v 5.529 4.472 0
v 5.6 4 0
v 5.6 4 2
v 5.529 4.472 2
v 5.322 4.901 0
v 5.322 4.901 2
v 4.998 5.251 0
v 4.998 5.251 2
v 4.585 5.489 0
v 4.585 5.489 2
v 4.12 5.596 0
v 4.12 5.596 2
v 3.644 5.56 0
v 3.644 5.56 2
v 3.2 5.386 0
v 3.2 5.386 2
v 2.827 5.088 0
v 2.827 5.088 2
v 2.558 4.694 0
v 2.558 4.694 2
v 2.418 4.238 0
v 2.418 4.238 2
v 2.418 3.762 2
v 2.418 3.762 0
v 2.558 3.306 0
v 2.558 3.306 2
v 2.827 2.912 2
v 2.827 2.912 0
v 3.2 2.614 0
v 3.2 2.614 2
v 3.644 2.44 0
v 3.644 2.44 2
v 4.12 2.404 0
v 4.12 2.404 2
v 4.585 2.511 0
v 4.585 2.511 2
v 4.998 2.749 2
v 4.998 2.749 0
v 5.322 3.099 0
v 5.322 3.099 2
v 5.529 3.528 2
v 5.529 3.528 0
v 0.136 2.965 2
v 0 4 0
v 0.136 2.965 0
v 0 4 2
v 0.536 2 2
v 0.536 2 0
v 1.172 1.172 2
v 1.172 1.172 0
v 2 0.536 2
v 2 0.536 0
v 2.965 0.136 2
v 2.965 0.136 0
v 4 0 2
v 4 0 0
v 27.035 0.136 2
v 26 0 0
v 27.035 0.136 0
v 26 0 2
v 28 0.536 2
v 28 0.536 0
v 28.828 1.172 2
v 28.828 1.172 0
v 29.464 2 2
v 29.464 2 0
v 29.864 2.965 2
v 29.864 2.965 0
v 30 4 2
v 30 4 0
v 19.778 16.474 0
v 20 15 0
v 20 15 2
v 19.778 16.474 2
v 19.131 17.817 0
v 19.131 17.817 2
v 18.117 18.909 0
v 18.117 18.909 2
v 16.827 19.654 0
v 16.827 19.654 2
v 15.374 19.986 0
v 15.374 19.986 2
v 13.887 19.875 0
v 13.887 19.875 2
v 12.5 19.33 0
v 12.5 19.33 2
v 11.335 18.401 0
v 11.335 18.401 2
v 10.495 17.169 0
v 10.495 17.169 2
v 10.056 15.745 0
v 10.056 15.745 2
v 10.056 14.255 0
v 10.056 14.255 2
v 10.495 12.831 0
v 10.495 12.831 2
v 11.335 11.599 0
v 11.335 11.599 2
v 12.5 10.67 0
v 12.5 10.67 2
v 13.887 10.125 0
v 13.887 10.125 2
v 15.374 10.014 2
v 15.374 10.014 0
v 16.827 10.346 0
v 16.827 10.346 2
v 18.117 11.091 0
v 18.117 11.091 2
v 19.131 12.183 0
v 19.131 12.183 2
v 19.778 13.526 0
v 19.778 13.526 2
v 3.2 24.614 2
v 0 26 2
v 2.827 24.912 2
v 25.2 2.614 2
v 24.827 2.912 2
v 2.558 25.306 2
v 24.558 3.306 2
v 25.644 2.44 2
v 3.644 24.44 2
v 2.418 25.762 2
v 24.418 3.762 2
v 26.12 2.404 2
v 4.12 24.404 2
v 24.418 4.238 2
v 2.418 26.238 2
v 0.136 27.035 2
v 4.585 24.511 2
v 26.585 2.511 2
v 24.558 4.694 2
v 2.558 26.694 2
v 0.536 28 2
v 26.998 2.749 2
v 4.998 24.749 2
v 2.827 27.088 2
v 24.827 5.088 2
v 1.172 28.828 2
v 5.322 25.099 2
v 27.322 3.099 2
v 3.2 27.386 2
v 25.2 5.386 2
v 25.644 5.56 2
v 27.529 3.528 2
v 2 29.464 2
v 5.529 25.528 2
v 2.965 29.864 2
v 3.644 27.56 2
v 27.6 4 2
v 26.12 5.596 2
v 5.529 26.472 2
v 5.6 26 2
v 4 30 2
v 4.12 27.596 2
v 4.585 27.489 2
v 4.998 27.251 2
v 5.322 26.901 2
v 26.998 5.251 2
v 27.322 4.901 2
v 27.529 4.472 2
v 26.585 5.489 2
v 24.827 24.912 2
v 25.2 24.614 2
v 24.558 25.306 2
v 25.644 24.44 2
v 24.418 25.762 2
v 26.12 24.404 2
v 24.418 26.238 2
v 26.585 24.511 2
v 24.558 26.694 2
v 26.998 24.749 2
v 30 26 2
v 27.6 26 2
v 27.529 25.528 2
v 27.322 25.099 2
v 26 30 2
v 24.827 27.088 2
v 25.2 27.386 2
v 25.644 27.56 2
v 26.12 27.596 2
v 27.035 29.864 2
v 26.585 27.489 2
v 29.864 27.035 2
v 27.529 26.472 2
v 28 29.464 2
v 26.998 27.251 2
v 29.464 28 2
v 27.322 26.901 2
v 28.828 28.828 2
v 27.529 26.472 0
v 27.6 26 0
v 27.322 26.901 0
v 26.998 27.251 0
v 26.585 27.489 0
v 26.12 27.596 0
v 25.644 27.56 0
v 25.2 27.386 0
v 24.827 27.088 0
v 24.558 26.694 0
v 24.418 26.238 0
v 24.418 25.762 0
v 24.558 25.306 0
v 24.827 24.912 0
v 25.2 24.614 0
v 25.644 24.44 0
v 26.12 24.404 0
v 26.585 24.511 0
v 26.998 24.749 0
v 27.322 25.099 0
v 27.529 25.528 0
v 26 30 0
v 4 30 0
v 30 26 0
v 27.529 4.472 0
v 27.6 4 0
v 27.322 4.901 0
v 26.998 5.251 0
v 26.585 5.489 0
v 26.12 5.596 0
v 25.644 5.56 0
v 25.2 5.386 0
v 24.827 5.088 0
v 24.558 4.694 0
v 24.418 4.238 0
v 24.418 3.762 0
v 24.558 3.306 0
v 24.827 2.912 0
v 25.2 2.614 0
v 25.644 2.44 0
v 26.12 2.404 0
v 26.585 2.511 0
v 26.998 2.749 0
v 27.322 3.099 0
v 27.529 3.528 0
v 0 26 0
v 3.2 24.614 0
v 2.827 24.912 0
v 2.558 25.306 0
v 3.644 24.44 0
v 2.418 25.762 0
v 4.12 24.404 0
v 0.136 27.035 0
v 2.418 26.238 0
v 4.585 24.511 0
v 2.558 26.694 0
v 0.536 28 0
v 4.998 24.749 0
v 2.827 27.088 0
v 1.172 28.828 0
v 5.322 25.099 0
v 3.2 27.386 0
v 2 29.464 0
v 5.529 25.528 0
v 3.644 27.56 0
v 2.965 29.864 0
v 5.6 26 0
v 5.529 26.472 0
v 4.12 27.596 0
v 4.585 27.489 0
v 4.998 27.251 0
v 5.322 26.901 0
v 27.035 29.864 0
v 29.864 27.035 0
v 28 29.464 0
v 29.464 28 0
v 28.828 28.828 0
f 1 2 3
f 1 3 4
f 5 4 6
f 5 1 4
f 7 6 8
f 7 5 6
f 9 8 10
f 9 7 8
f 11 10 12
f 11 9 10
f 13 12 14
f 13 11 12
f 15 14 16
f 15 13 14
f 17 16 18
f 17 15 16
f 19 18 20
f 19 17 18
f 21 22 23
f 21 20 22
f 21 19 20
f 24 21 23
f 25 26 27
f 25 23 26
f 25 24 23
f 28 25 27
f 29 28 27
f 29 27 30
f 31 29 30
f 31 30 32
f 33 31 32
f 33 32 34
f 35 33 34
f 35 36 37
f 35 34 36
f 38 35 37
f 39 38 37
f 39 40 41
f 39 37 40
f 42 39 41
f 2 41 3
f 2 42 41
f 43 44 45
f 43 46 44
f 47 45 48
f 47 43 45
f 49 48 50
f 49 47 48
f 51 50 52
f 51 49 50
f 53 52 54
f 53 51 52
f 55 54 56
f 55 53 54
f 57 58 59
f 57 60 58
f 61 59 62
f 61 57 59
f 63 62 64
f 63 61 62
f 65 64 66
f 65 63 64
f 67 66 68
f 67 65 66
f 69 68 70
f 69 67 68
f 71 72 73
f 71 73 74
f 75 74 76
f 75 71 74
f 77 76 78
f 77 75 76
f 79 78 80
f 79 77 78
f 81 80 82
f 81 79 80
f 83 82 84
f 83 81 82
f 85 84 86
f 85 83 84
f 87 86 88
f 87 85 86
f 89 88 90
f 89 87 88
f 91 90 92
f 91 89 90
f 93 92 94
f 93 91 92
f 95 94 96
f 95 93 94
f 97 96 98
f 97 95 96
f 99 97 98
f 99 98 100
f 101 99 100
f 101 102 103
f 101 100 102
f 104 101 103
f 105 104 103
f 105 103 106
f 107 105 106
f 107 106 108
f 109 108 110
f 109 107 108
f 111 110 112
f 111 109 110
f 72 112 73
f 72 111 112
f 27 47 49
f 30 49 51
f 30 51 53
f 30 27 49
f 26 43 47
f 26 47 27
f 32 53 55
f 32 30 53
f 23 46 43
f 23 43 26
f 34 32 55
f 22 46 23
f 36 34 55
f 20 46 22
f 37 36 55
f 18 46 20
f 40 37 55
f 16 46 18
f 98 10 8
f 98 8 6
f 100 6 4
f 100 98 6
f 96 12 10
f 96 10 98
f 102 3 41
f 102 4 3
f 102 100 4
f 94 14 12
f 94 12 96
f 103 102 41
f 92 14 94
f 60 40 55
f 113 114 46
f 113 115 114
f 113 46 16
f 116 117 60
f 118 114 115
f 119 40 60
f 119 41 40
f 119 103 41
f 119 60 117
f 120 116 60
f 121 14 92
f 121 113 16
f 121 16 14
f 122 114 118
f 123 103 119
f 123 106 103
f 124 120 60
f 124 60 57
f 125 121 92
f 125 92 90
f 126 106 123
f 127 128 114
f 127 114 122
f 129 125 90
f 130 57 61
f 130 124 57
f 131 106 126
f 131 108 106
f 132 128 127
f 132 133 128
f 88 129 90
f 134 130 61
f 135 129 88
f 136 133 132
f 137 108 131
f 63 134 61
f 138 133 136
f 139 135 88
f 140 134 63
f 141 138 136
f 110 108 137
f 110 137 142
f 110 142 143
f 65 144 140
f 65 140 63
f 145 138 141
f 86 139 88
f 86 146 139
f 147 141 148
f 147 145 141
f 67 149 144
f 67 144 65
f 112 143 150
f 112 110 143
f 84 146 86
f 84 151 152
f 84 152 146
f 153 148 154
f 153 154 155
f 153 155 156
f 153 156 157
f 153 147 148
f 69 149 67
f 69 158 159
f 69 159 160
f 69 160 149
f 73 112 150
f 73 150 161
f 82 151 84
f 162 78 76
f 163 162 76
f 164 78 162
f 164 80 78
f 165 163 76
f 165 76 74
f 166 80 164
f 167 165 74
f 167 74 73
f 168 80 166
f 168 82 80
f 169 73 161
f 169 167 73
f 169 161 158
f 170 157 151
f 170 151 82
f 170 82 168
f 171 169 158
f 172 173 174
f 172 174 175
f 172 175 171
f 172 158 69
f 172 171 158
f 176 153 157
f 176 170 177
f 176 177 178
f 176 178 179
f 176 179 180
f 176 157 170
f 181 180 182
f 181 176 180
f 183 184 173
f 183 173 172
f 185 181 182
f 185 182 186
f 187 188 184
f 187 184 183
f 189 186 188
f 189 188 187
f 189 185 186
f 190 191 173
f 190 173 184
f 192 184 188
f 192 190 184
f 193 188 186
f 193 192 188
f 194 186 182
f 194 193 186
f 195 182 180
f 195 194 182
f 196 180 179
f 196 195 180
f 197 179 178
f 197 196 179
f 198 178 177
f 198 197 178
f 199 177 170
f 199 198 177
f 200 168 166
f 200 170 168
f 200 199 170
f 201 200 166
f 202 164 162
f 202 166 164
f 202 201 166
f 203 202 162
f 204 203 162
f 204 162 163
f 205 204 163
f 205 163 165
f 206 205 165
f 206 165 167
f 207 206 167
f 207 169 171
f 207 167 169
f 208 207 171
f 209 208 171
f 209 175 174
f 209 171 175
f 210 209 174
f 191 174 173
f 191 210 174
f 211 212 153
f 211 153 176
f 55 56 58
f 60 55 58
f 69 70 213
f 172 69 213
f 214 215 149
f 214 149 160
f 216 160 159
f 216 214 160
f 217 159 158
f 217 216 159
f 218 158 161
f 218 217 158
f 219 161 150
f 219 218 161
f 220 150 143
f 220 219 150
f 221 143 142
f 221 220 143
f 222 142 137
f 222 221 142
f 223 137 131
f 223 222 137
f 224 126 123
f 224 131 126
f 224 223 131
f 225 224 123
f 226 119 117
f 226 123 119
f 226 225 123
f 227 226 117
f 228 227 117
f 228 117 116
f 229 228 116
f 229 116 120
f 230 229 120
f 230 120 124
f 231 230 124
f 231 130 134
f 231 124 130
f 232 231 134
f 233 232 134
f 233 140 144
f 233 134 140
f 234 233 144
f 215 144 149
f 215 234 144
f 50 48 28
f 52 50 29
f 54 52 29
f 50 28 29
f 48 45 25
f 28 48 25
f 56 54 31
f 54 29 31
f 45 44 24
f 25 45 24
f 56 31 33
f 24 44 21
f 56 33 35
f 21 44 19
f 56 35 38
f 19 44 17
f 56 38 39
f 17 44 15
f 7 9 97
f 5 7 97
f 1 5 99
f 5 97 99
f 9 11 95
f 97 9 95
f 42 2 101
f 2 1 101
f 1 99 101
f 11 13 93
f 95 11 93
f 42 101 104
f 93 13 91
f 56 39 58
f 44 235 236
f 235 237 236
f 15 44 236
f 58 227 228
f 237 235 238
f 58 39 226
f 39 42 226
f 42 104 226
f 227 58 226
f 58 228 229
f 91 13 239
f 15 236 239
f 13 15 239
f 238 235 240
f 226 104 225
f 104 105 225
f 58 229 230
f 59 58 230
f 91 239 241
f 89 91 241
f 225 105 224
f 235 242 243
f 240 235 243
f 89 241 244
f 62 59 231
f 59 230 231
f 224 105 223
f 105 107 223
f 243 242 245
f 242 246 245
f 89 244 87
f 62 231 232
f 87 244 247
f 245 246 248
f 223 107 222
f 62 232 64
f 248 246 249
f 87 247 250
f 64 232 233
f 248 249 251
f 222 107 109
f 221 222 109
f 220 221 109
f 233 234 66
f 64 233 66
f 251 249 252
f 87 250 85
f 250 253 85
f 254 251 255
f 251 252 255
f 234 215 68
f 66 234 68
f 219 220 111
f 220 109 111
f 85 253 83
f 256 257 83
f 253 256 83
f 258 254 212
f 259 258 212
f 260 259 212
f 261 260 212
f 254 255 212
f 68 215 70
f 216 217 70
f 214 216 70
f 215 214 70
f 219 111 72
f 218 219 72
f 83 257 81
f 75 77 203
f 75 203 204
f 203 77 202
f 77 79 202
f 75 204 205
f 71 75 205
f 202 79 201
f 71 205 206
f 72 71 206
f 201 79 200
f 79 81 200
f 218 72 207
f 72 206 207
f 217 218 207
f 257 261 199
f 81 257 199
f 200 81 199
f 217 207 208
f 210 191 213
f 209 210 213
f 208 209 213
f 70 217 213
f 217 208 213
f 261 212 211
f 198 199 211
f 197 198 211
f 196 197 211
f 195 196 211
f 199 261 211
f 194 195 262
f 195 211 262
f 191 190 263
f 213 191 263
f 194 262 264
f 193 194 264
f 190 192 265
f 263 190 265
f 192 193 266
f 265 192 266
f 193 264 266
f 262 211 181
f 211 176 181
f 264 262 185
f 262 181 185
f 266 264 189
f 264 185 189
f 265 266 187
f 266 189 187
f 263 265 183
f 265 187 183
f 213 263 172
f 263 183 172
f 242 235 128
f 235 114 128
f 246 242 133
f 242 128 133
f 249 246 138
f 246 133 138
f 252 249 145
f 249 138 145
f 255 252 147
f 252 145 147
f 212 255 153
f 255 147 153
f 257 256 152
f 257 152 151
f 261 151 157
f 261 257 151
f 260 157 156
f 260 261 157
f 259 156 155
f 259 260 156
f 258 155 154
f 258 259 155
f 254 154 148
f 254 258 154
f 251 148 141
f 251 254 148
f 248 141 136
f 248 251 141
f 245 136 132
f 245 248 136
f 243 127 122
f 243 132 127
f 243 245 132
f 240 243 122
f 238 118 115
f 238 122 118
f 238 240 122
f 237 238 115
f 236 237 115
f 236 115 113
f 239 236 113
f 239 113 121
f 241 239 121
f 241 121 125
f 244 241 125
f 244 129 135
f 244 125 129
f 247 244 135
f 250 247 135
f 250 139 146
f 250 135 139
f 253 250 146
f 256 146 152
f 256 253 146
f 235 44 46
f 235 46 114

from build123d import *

# Parameters (mm, degrees)
CYLINDER057_R       = 5
CYLINDER057_DEPTH   = 15
CYLINDER058_R       = 1.6
CYLINDER058_DEPTH   = 20
ARRAY001029_X_COUNT = 2
ARRAY001029_X_PITCH = 22
ARRAY001029_Y_COUNT = 2
ARRAY001029_Y_PITCH = 22
BOX007_W            = 30
BOX007_H            = 30
BOX007_DEPTH        = 2
FILLET013_R         = 4


with BuildPart() as side_bearing_central_hole_cylinder001:
    # Cylinder057 → Cylinder057 (new body)
    with BuildSketch(Plane(origin=(15, 15, -4), x_dir=(1, 0, 0), z_dir=(0, 0, 1))):
        Circle(CYLINDER057_R)
    extrude(amount=CYLINDER057_DEPTH)


with BuildPart() as fusion039:
    # Cylinder058 → Cylinder058 (new body)
    with BuildSketch(Plane(origin=(4, 4, -7), x_dir=(1, 0, 0), z_dir=(0, 0, 1))):
        Circle(CYLINDER058_R)
    extrude(amount=CYLINDER058_DEPTH)

    # Array001029 X: Fusion039 ×2


with BuildPart() as fusion039_1:
    add(fusion039.part)
    with Locations(*[(i * ARRAY001029_X_PITCH, 0, 0) for i in range(1, ARRAY001029_X_COUNT)]):
        add(fusion039.part)

    # Array001029 Y: Fusion039 ×2


with BuildPart() as fusion039_2:
    add(fusion039_1.part)
    with Locations(*[(0, i * ARRAY001029_Y_PITCH, 0) for i in range(1, ARRAY001029_Y_COUNT)]):
        add(fusion039_1.part)

    # Fusion039: union side bearing central hole cylinder001
    add(side_bearing_central_hole_cylinder001.part)


with BuildPart() as bearing_cover_fillet:
    # Box007 → Box007 (new body)
    with BuildSketch(Plane.XY):
        with Locations((15, 15)):
            Rectangle(BOX007_W, BOX007_H)
    extrude(amount=BOX007_DEPTH)

    # Cut023004: cut Fusion039
    add(fusion039_2.part, mode=Mode.SUBTRACT)

    # Fillet013
    fillet013_edges = [bearing_cover_fillet.edges().sort_by_distance(p)[0] for p in [
        (0, 0, 1),
        (0, 30, 1),
        (30, 0, 1),
        (30, 30, 1),
    ]]
    fillet(fillet013_edges, radius=FILLET013_R)


solid = bearing_cover_fillet.part
